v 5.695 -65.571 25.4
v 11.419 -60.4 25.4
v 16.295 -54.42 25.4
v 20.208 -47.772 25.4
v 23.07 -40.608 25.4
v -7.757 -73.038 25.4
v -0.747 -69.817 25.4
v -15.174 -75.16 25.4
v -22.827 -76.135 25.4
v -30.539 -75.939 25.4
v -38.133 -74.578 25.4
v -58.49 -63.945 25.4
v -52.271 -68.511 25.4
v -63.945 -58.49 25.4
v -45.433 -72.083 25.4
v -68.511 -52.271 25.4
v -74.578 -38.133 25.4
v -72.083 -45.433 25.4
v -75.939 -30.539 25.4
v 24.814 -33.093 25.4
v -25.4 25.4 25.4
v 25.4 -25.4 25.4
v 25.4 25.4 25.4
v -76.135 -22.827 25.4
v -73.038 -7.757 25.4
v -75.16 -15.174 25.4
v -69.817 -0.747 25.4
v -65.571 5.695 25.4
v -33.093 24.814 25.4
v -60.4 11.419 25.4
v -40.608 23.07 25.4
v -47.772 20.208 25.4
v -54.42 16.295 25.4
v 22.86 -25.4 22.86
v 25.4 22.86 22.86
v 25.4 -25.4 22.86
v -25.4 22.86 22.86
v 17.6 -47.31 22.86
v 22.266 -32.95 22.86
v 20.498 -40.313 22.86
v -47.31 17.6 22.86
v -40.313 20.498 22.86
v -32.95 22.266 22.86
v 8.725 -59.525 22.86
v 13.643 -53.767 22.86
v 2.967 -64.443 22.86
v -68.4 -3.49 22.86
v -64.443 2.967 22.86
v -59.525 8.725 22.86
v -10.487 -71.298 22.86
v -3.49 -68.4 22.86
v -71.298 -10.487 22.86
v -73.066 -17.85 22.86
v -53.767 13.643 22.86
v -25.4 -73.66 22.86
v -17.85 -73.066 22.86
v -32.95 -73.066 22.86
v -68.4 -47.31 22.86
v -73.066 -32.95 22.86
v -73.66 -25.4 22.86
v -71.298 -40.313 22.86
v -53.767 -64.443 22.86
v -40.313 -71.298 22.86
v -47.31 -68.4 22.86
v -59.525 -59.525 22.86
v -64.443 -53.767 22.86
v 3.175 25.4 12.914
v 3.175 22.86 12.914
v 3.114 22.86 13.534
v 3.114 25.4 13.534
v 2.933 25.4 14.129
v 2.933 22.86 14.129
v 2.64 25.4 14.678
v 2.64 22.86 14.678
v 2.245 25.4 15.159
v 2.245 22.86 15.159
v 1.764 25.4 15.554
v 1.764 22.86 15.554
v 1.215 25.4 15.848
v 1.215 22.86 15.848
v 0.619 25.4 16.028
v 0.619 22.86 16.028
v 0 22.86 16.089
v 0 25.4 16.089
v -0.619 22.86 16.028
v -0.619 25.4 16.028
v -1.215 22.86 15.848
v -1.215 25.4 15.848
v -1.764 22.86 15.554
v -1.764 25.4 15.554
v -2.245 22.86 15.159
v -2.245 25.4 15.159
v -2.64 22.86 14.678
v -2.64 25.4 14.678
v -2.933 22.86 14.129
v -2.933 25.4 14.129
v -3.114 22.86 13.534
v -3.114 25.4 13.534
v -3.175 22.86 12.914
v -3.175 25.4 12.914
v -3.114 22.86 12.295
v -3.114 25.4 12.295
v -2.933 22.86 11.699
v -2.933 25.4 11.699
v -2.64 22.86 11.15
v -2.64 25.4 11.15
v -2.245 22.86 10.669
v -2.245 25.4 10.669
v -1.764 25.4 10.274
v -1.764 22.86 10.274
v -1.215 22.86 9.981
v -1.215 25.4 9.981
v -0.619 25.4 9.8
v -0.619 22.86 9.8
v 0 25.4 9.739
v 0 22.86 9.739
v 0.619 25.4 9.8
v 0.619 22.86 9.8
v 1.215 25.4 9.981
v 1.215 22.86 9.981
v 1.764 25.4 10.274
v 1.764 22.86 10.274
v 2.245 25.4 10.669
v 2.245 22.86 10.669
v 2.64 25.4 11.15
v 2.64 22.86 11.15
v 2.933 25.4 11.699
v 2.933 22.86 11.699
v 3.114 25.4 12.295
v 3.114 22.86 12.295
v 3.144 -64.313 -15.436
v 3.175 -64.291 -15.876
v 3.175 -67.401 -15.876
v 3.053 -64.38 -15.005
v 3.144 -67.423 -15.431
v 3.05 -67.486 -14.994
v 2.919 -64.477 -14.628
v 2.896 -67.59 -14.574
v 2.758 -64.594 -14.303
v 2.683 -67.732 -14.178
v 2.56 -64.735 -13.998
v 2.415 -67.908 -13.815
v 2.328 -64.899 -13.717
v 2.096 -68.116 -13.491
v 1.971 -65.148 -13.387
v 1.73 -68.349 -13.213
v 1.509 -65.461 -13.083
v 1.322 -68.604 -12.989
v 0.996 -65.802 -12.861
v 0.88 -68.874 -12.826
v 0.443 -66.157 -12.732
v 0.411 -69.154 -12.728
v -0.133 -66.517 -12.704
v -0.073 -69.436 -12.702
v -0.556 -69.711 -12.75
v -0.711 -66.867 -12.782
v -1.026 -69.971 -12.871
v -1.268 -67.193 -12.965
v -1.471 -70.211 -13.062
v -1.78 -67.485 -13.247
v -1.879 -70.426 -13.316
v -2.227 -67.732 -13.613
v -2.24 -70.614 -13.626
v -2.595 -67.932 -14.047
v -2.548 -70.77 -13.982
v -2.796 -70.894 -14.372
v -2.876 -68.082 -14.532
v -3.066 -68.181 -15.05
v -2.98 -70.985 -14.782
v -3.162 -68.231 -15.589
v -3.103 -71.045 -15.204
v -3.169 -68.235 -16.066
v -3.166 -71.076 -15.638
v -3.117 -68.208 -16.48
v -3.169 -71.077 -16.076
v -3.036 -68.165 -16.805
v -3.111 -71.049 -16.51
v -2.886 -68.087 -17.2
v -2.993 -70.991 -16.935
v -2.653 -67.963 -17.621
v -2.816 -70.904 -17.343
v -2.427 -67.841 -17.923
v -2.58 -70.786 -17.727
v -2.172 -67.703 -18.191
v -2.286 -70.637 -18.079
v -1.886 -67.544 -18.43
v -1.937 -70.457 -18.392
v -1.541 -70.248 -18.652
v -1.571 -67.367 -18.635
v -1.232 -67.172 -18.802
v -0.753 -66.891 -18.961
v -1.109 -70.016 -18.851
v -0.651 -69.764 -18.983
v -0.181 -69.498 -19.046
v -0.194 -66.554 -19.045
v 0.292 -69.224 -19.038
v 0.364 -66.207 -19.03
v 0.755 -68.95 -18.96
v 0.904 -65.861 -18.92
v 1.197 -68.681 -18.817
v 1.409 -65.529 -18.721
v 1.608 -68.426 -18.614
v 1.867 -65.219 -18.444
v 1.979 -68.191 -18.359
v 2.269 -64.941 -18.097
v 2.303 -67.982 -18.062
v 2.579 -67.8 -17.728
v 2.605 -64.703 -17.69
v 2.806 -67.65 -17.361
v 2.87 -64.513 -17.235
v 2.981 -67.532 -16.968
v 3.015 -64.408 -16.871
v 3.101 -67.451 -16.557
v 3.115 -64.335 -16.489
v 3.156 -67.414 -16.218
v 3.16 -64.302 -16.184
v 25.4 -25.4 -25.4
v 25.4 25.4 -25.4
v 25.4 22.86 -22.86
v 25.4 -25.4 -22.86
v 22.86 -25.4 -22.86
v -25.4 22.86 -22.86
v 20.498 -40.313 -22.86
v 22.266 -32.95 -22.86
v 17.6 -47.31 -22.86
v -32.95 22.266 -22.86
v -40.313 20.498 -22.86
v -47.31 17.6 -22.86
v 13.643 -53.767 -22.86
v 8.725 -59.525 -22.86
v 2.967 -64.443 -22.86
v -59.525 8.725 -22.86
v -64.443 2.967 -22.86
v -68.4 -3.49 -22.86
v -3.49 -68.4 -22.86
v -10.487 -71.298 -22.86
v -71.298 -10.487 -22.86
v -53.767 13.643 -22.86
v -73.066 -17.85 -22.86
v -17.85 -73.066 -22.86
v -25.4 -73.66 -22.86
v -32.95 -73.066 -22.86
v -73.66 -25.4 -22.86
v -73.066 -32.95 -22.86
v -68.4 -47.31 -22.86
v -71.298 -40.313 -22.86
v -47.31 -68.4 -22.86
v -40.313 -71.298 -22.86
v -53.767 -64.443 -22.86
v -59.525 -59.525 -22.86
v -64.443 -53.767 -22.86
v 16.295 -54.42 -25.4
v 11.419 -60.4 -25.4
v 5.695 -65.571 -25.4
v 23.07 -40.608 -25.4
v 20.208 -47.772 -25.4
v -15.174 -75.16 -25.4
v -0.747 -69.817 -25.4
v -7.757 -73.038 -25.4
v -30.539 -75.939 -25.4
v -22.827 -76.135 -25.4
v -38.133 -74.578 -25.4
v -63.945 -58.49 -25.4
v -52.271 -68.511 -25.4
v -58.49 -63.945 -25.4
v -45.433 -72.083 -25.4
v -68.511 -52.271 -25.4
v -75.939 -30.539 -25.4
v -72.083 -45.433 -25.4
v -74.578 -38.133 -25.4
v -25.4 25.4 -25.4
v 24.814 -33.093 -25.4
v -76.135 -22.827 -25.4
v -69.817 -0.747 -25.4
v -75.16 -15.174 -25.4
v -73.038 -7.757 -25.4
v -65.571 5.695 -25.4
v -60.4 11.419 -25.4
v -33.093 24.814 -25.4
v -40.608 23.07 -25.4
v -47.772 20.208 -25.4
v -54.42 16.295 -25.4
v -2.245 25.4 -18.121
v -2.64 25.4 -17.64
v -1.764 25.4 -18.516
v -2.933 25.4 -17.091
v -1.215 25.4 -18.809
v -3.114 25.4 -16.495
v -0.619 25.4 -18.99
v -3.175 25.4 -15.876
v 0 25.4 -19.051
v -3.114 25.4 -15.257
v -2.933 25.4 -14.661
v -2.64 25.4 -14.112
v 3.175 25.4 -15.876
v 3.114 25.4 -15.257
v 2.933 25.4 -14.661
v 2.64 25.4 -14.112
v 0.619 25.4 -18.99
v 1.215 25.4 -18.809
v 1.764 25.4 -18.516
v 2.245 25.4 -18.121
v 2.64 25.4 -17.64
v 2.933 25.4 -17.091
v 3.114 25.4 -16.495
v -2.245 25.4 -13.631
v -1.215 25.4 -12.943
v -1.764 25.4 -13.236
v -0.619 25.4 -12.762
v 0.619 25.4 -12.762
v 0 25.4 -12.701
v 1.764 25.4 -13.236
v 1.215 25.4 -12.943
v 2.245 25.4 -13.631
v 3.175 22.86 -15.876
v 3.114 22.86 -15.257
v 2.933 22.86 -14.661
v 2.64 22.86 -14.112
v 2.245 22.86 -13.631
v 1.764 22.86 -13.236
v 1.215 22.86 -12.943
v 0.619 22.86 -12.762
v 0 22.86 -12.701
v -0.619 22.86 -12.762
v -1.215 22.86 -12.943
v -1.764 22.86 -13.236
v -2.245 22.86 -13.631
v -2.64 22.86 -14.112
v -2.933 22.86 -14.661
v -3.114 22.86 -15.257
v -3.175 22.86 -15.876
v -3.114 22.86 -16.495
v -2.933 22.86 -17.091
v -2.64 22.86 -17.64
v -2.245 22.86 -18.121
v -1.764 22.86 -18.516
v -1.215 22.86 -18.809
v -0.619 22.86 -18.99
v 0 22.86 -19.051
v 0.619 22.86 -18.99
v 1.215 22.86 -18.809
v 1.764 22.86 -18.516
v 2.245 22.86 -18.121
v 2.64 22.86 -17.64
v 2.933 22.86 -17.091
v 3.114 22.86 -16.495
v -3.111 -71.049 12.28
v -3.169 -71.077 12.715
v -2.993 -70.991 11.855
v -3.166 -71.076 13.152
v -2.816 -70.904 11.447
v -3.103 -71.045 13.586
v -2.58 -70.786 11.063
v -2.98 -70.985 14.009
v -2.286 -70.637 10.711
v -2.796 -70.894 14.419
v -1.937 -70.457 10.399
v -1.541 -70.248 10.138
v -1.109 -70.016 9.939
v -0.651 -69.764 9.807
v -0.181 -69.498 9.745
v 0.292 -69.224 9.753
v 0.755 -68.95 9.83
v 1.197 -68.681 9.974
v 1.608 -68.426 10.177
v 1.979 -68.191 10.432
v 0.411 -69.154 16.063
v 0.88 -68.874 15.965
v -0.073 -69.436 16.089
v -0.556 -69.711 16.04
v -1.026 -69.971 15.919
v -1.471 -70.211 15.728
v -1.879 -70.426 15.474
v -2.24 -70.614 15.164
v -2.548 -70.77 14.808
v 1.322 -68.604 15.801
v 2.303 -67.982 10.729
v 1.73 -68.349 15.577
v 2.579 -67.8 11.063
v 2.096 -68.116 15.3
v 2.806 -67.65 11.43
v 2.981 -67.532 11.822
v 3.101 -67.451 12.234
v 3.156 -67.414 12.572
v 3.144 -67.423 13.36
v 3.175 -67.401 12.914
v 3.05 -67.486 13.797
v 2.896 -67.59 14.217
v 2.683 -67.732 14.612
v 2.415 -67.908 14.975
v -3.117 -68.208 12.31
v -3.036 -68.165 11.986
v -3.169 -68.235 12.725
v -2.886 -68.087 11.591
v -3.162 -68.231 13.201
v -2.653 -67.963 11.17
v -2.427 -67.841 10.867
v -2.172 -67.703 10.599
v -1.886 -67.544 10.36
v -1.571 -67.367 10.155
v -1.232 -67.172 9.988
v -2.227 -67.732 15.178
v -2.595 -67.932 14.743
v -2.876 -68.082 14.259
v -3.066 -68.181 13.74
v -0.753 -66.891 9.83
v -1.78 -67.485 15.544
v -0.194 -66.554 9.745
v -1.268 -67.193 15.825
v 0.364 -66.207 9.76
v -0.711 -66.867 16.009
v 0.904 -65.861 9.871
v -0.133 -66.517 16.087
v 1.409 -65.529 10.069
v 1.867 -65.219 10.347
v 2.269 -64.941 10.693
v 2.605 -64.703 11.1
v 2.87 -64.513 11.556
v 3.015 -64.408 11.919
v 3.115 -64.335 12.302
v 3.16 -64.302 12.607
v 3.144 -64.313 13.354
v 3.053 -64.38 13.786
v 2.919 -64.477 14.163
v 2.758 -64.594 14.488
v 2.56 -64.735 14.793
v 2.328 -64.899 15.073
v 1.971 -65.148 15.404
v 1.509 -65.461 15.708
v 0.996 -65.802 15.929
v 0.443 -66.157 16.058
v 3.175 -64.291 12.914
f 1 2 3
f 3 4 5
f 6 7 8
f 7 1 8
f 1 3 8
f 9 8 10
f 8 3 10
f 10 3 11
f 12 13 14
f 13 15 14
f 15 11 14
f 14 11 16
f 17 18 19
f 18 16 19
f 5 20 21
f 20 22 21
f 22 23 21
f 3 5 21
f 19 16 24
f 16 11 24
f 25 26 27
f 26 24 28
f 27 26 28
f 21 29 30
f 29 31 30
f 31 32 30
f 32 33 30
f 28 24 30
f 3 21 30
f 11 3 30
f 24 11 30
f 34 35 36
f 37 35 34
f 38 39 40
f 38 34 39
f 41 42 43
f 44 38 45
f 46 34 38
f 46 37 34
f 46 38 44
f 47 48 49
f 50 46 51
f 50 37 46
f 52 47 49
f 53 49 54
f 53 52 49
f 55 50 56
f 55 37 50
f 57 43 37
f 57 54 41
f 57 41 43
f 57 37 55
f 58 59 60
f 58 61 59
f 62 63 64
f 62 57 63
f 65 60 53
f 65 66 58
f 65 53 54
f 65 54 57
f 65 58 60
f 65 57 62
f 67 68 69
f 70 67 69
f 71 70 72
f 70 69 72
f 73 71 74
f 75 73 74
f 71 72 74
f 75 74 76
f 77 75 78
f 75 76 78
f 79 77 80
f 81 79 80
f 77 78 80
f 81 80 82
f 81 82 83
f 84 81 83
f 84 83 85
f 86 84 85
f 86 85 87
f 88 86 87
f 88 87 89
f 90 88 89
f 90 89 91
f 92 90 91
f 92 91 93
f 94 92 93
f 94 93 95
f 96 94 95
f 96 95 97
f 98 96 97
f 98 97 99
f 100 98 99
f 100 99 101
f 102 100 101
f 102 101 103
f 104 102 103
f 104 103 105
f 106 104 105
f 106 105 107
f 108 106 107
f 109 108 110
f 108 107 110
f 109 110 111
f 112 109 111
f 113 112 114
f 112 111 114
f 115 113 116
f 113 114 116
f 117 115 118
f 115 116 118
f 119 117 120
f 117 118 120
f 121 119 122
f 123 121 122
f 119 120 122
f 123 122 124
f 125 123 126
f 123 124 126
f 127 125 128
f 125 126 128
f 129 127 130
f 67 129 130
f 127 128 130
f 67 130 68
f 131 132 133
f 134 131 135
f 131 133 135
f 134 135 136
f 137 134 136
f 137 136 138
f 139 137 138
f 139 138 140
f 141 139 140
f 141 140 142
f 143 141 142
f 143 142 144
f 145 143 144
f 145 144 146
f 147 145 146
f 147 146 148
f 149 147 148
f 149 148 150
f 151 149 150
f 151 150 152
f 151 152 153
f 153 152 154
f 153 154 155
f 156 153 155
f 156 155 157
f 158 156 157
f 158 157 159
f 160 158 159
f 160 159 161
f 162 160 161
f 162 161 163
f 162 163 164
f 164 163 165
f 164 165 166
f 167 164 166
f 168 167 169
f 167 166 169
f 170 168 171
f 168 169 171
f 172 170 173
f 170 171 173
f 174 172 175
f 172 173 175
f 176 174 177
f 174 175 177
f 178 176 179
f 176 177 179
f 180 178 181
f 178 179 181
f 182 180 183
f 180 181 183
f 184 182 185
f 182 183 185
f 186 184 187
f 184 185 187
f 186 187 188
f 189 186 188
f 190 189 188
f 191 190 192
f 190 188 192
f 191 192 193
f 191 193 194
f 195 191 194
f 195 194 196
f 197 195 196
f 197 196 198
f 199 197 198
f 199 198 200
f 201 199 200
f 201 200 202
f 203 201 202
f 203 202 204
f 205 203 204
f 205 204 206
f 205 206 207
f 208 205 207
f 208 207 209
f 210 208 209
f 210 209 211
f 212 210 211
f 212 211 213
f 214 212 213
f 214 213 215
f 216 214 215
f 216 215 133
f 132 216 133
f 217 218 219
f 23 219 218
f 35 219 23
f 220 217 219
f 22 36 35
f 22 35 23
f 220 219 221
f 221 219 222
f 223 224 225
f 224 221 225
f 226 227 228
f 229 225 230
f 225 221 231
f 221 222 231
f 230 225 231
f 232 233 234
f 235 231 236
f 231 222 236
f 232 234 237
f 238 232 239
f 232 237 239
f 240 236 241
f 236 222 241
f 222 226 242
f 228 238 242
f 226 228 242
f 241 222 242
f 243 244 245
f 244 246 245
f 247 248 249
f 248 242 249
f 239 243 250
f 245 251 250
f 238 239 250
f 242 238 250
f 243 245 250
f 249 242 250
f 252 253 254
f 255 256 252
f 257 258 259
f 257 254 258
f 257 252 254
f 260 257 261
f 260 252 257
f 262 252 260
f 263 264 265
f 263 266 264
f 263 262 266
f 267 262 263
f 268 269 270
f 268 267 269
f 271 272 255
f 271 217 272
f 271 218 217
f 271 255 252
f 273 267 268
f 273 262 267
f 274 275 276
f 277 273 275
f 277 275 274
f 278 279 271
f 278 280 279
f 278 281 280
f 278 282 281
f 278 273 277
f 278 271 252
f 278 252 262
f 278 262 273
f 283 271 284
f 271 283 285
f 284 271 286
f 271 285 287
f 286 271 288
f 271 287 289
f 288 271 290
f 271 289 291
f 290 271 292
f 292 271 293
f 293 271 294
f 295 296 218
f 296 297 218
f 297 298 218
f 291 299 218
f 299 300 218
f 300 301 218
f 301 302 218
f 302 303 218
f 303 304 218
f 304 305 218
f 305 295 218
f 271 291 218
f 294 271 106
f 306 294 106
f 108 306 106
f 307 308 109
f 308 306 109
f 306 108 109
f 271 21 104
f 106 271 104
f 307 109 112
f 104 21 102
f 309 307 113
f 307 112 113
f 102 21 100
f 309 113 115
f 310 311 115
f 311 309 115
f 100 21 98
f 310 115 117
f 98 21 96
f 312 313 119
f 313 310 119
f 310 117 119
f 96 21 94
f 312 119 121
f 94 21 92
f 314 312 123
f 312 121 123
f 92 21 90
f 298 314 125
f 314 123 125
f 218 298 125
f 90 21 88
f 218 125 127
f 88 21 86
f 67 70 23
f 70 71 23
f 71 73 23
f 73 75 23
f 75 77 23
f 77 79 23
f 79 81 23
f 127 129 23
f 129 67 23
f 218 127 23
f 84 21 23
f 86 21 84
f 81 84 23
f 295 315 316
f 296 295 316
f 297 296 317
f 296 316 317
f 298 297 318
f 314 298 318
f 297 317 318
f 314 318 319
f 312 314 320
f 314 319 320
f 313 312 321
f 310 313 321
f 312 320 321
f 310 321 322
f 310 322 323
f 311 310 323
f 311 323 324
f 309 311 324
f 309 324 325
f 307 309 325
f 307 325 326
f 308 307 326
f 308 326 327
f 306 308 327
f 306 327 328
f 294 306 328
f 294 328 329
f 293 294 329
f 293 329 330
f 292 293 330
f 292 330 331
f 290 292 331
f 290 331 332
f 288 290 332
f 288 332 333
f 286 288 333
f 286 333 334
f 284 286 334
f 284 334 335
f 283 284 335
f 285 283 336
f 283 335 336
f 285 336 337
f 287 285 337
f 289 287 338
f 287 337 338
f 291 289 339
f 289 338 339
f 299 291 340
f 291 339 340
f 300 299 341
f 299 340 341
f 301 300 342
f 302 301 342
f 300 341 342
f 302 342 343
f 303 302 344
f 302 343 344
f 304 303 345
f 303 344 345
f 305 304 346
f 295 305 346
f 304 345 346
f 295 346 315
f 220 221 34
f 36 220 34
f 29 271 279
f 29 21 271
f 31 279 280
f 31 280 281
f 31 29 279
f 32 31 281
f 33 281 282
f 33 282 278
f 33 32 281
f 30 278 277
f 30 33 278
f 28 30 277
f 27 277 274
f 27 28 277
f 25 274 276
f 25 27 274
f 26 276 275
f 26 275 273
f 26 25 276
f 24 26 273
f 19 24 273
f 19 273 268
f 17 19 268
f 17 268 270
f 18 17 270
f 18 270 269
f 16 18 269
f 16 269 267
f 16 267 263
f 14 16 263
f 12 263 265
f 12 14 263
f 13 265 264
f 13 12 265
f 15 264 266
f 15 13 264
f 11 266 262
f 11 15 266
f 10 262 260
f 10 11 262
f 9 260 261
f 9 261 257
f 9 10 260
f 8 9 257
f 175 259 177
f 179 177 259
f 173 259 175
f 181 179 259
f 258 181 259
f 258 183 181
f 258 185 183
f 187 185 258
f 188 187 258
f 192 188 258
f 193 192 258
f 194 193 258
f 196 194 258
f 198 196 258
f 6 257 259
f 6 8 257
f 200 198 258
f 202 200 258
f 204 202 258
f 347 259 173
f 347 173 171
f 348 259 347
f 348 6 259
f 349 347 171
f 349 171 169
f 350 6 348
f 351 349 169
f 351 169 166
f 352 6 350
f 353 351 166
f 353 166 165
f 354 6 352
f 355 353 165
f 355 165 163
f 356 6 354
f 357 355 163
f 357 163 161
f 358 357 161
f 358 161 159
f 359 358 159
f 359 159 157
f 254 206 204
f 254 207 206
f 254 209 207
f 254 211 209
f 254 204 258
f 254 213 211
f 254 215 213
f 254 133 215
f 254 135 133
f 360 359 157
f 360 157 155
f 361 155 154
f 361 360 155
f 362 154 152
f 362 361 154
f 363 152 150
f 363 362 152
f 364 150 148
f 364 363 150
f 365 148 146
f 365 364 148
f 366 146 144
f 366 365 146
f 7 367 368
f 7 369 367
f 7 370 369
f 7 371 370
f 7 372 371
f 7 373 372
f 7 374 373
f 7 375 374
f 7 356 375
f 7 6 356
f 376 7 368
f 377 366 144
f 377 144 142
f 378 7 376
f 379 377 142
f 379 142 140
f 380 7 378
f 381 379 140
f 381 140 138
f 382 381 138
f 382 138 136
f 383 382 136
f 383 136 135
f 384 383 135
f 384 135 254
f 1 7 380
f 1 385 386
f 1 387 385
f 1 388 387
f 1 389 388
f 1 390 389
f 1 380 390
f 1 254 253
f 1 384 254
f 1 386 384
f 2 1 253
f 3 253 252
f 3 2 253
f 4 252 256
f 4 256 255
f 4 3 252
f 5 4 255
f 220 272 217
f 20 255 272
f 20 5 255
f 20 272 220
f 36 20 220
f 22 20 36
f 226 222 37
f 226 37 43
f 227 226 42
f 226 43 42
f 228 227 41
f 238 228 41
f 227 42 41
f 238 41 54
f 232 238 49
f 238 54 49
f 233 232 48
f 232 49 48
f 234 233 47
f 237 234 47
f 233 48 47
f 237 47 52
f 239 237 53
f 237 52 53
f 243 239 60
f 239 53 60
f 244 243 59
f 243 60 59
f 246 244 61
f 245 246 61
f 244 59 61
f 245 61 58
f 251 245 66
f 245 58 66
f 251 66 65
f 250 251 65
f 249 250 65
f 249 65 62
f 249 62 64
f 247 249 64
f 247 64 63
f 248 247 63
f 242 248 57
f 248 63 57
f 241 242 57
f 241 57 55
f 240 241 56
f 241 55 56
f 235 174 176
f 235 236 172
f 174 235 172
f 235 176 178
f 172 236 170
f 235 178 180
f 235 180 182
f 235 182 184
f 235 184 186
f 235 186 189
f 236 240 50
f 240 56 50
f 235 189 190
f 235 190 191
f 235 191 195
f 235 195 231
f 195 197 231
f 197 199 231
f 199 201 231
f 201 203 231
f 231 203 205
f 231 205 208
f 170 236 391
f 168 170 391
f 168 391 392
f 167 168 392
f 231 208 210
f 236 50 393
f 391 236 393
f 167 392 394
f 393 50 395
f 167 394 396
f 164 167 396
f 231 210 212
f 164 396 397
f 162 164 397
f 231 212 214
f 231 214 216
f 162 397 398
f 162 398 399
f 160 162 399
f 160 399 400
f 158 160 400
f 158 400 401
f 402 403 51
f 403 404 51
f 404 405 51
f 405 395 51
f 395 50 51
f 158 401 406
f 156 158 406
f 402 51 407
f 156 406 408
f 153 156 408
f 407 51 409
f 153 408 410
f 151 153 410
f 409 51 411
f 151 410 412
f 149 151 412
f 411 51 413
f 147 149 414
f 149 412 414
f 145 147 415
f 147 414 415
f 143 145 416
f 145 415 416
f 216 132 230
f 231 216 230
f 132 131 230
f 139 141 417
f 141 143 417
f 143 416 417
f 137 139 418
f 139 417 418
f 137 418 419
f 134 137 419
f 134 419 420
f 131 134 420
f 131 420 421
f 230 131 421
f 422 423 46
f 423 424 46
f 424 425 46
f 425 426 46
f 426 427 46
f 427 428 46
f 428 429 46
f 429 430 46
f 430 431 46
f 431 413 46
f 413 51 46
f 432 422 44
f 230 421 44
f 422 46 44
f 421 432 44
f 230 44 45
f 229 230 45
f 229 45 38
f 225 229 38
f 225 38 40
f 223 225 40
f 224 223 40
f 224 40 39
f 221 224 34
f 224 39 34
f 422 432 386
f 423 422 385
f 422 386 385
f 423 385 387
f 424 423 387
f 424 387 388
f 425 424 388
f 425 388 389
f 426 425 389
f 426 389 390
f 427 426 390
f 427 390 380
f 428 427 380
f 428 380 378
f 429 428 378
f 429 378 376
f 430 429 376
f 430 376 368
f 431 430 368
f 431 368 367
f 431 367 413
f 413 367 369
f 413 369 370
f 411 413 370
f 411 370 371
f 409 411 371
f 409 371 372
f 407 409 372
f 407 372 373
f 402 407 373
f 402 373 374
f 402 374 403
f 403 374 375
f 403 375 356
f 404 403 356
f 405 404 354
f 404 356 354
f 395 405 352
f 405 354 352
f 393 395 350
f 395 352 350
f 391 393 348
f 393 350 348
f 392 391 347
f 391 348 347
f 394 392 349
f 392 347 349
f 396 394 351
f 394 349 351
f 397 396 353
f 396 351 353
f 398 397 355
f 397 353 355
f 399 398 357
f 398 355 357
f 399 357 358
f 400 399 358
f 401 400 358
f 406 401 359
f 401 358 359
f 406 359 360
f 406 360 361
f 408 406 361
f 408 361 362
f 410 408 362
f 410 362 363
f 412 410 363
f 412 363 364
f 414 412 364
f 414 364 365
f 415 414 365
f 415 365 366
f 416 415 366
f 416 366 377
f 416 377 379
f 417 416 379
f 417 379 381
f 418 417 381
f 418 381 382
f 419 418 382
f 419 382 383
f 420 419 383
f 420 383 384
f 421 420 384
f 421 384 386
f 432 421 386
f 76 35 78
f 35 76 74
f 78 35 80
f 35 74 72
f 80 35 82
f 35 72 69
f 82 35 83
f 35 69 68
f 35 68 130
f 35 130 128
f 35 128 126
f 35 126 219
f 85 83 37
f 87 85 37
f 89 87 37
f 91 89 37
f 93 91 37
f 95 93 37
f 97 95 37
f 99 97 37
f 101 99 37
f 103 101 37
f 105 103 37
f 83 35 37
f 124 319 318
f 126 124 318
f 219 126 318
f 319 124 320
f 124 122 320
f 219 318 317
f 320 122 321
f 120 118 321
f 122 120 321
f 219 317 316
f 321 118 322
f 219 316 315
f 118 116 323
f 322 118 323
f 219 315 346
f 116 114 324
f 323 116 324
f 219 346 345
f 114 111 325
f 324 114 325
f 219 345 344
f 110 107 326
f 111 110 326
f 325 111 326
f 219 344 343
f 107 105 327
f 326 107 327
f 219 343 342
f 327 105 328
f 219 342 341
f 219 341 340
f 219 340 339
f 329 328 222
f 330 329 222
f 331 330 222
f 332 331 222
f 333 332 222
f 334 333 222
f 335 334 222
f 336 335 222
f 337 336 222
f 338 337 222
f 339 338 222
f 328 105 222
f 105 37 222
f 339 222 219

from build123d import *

# Parameters (mm, degrees)
F0_W      = 50.8
F0_H      = 50.8
F1_DEPTH  = 25.4
F1_FACE_W = 50.8
F1_FACE_H = 50.8
F3_T      = -2.54
F5_D      = 6.35


# Not quite as in the source:
# - a shell that OpenCascade refuses in one call is made with other operations: the cavity is built on its own and cut out


with BuildPart() as f1:
    # F0 (on Front) → F1 (new body, symmetric)
    with BuildSketch(Plane.XZ):
        Rectangle(F0_W, F0_H)
    extrude(amount=F1_DEPTH, both=True)

    # F1_face (on face) → F2 (revolve)
    with BuildSketch(Plane.XZ.offset(25.4)):
        Rectangle(F1_FACE_W, F1_FACE_H)
    revolve(axis=Axis((-25.4, -25.4, 0), (0, 0, 1)))

    # F3: a shell. OpenCascade refuses it in one call, so the cavity is built on its own and cut out:
    # the body offset inwards by the wall thickness, plus a prism from it out through each open face.
    f3_core = offset(f1.part, amount=F3_T, mode=Mode.PRIVATE)
    f3_exits = [f3_core.faces().sort_by_distance(p)[0] for p in [
        (22.86, -1.27, 0),
    ]]
    add(f3_core, mode=Mode.SUBTRACT)
    extrude(f3_exits, amount=-F3_T, mode=Mode.SUBTRACT)

    # F5 (through all)
    with Locations(Plane(origin=(0, 25.4, 0), x_dir=(-1, 0, 0), z_dir=(0, 1, 0))):
        with Locations((0, 12.914407067), (0, -15.8760398626)):
            Hole(F5_D / 2)


solid = f1.part
